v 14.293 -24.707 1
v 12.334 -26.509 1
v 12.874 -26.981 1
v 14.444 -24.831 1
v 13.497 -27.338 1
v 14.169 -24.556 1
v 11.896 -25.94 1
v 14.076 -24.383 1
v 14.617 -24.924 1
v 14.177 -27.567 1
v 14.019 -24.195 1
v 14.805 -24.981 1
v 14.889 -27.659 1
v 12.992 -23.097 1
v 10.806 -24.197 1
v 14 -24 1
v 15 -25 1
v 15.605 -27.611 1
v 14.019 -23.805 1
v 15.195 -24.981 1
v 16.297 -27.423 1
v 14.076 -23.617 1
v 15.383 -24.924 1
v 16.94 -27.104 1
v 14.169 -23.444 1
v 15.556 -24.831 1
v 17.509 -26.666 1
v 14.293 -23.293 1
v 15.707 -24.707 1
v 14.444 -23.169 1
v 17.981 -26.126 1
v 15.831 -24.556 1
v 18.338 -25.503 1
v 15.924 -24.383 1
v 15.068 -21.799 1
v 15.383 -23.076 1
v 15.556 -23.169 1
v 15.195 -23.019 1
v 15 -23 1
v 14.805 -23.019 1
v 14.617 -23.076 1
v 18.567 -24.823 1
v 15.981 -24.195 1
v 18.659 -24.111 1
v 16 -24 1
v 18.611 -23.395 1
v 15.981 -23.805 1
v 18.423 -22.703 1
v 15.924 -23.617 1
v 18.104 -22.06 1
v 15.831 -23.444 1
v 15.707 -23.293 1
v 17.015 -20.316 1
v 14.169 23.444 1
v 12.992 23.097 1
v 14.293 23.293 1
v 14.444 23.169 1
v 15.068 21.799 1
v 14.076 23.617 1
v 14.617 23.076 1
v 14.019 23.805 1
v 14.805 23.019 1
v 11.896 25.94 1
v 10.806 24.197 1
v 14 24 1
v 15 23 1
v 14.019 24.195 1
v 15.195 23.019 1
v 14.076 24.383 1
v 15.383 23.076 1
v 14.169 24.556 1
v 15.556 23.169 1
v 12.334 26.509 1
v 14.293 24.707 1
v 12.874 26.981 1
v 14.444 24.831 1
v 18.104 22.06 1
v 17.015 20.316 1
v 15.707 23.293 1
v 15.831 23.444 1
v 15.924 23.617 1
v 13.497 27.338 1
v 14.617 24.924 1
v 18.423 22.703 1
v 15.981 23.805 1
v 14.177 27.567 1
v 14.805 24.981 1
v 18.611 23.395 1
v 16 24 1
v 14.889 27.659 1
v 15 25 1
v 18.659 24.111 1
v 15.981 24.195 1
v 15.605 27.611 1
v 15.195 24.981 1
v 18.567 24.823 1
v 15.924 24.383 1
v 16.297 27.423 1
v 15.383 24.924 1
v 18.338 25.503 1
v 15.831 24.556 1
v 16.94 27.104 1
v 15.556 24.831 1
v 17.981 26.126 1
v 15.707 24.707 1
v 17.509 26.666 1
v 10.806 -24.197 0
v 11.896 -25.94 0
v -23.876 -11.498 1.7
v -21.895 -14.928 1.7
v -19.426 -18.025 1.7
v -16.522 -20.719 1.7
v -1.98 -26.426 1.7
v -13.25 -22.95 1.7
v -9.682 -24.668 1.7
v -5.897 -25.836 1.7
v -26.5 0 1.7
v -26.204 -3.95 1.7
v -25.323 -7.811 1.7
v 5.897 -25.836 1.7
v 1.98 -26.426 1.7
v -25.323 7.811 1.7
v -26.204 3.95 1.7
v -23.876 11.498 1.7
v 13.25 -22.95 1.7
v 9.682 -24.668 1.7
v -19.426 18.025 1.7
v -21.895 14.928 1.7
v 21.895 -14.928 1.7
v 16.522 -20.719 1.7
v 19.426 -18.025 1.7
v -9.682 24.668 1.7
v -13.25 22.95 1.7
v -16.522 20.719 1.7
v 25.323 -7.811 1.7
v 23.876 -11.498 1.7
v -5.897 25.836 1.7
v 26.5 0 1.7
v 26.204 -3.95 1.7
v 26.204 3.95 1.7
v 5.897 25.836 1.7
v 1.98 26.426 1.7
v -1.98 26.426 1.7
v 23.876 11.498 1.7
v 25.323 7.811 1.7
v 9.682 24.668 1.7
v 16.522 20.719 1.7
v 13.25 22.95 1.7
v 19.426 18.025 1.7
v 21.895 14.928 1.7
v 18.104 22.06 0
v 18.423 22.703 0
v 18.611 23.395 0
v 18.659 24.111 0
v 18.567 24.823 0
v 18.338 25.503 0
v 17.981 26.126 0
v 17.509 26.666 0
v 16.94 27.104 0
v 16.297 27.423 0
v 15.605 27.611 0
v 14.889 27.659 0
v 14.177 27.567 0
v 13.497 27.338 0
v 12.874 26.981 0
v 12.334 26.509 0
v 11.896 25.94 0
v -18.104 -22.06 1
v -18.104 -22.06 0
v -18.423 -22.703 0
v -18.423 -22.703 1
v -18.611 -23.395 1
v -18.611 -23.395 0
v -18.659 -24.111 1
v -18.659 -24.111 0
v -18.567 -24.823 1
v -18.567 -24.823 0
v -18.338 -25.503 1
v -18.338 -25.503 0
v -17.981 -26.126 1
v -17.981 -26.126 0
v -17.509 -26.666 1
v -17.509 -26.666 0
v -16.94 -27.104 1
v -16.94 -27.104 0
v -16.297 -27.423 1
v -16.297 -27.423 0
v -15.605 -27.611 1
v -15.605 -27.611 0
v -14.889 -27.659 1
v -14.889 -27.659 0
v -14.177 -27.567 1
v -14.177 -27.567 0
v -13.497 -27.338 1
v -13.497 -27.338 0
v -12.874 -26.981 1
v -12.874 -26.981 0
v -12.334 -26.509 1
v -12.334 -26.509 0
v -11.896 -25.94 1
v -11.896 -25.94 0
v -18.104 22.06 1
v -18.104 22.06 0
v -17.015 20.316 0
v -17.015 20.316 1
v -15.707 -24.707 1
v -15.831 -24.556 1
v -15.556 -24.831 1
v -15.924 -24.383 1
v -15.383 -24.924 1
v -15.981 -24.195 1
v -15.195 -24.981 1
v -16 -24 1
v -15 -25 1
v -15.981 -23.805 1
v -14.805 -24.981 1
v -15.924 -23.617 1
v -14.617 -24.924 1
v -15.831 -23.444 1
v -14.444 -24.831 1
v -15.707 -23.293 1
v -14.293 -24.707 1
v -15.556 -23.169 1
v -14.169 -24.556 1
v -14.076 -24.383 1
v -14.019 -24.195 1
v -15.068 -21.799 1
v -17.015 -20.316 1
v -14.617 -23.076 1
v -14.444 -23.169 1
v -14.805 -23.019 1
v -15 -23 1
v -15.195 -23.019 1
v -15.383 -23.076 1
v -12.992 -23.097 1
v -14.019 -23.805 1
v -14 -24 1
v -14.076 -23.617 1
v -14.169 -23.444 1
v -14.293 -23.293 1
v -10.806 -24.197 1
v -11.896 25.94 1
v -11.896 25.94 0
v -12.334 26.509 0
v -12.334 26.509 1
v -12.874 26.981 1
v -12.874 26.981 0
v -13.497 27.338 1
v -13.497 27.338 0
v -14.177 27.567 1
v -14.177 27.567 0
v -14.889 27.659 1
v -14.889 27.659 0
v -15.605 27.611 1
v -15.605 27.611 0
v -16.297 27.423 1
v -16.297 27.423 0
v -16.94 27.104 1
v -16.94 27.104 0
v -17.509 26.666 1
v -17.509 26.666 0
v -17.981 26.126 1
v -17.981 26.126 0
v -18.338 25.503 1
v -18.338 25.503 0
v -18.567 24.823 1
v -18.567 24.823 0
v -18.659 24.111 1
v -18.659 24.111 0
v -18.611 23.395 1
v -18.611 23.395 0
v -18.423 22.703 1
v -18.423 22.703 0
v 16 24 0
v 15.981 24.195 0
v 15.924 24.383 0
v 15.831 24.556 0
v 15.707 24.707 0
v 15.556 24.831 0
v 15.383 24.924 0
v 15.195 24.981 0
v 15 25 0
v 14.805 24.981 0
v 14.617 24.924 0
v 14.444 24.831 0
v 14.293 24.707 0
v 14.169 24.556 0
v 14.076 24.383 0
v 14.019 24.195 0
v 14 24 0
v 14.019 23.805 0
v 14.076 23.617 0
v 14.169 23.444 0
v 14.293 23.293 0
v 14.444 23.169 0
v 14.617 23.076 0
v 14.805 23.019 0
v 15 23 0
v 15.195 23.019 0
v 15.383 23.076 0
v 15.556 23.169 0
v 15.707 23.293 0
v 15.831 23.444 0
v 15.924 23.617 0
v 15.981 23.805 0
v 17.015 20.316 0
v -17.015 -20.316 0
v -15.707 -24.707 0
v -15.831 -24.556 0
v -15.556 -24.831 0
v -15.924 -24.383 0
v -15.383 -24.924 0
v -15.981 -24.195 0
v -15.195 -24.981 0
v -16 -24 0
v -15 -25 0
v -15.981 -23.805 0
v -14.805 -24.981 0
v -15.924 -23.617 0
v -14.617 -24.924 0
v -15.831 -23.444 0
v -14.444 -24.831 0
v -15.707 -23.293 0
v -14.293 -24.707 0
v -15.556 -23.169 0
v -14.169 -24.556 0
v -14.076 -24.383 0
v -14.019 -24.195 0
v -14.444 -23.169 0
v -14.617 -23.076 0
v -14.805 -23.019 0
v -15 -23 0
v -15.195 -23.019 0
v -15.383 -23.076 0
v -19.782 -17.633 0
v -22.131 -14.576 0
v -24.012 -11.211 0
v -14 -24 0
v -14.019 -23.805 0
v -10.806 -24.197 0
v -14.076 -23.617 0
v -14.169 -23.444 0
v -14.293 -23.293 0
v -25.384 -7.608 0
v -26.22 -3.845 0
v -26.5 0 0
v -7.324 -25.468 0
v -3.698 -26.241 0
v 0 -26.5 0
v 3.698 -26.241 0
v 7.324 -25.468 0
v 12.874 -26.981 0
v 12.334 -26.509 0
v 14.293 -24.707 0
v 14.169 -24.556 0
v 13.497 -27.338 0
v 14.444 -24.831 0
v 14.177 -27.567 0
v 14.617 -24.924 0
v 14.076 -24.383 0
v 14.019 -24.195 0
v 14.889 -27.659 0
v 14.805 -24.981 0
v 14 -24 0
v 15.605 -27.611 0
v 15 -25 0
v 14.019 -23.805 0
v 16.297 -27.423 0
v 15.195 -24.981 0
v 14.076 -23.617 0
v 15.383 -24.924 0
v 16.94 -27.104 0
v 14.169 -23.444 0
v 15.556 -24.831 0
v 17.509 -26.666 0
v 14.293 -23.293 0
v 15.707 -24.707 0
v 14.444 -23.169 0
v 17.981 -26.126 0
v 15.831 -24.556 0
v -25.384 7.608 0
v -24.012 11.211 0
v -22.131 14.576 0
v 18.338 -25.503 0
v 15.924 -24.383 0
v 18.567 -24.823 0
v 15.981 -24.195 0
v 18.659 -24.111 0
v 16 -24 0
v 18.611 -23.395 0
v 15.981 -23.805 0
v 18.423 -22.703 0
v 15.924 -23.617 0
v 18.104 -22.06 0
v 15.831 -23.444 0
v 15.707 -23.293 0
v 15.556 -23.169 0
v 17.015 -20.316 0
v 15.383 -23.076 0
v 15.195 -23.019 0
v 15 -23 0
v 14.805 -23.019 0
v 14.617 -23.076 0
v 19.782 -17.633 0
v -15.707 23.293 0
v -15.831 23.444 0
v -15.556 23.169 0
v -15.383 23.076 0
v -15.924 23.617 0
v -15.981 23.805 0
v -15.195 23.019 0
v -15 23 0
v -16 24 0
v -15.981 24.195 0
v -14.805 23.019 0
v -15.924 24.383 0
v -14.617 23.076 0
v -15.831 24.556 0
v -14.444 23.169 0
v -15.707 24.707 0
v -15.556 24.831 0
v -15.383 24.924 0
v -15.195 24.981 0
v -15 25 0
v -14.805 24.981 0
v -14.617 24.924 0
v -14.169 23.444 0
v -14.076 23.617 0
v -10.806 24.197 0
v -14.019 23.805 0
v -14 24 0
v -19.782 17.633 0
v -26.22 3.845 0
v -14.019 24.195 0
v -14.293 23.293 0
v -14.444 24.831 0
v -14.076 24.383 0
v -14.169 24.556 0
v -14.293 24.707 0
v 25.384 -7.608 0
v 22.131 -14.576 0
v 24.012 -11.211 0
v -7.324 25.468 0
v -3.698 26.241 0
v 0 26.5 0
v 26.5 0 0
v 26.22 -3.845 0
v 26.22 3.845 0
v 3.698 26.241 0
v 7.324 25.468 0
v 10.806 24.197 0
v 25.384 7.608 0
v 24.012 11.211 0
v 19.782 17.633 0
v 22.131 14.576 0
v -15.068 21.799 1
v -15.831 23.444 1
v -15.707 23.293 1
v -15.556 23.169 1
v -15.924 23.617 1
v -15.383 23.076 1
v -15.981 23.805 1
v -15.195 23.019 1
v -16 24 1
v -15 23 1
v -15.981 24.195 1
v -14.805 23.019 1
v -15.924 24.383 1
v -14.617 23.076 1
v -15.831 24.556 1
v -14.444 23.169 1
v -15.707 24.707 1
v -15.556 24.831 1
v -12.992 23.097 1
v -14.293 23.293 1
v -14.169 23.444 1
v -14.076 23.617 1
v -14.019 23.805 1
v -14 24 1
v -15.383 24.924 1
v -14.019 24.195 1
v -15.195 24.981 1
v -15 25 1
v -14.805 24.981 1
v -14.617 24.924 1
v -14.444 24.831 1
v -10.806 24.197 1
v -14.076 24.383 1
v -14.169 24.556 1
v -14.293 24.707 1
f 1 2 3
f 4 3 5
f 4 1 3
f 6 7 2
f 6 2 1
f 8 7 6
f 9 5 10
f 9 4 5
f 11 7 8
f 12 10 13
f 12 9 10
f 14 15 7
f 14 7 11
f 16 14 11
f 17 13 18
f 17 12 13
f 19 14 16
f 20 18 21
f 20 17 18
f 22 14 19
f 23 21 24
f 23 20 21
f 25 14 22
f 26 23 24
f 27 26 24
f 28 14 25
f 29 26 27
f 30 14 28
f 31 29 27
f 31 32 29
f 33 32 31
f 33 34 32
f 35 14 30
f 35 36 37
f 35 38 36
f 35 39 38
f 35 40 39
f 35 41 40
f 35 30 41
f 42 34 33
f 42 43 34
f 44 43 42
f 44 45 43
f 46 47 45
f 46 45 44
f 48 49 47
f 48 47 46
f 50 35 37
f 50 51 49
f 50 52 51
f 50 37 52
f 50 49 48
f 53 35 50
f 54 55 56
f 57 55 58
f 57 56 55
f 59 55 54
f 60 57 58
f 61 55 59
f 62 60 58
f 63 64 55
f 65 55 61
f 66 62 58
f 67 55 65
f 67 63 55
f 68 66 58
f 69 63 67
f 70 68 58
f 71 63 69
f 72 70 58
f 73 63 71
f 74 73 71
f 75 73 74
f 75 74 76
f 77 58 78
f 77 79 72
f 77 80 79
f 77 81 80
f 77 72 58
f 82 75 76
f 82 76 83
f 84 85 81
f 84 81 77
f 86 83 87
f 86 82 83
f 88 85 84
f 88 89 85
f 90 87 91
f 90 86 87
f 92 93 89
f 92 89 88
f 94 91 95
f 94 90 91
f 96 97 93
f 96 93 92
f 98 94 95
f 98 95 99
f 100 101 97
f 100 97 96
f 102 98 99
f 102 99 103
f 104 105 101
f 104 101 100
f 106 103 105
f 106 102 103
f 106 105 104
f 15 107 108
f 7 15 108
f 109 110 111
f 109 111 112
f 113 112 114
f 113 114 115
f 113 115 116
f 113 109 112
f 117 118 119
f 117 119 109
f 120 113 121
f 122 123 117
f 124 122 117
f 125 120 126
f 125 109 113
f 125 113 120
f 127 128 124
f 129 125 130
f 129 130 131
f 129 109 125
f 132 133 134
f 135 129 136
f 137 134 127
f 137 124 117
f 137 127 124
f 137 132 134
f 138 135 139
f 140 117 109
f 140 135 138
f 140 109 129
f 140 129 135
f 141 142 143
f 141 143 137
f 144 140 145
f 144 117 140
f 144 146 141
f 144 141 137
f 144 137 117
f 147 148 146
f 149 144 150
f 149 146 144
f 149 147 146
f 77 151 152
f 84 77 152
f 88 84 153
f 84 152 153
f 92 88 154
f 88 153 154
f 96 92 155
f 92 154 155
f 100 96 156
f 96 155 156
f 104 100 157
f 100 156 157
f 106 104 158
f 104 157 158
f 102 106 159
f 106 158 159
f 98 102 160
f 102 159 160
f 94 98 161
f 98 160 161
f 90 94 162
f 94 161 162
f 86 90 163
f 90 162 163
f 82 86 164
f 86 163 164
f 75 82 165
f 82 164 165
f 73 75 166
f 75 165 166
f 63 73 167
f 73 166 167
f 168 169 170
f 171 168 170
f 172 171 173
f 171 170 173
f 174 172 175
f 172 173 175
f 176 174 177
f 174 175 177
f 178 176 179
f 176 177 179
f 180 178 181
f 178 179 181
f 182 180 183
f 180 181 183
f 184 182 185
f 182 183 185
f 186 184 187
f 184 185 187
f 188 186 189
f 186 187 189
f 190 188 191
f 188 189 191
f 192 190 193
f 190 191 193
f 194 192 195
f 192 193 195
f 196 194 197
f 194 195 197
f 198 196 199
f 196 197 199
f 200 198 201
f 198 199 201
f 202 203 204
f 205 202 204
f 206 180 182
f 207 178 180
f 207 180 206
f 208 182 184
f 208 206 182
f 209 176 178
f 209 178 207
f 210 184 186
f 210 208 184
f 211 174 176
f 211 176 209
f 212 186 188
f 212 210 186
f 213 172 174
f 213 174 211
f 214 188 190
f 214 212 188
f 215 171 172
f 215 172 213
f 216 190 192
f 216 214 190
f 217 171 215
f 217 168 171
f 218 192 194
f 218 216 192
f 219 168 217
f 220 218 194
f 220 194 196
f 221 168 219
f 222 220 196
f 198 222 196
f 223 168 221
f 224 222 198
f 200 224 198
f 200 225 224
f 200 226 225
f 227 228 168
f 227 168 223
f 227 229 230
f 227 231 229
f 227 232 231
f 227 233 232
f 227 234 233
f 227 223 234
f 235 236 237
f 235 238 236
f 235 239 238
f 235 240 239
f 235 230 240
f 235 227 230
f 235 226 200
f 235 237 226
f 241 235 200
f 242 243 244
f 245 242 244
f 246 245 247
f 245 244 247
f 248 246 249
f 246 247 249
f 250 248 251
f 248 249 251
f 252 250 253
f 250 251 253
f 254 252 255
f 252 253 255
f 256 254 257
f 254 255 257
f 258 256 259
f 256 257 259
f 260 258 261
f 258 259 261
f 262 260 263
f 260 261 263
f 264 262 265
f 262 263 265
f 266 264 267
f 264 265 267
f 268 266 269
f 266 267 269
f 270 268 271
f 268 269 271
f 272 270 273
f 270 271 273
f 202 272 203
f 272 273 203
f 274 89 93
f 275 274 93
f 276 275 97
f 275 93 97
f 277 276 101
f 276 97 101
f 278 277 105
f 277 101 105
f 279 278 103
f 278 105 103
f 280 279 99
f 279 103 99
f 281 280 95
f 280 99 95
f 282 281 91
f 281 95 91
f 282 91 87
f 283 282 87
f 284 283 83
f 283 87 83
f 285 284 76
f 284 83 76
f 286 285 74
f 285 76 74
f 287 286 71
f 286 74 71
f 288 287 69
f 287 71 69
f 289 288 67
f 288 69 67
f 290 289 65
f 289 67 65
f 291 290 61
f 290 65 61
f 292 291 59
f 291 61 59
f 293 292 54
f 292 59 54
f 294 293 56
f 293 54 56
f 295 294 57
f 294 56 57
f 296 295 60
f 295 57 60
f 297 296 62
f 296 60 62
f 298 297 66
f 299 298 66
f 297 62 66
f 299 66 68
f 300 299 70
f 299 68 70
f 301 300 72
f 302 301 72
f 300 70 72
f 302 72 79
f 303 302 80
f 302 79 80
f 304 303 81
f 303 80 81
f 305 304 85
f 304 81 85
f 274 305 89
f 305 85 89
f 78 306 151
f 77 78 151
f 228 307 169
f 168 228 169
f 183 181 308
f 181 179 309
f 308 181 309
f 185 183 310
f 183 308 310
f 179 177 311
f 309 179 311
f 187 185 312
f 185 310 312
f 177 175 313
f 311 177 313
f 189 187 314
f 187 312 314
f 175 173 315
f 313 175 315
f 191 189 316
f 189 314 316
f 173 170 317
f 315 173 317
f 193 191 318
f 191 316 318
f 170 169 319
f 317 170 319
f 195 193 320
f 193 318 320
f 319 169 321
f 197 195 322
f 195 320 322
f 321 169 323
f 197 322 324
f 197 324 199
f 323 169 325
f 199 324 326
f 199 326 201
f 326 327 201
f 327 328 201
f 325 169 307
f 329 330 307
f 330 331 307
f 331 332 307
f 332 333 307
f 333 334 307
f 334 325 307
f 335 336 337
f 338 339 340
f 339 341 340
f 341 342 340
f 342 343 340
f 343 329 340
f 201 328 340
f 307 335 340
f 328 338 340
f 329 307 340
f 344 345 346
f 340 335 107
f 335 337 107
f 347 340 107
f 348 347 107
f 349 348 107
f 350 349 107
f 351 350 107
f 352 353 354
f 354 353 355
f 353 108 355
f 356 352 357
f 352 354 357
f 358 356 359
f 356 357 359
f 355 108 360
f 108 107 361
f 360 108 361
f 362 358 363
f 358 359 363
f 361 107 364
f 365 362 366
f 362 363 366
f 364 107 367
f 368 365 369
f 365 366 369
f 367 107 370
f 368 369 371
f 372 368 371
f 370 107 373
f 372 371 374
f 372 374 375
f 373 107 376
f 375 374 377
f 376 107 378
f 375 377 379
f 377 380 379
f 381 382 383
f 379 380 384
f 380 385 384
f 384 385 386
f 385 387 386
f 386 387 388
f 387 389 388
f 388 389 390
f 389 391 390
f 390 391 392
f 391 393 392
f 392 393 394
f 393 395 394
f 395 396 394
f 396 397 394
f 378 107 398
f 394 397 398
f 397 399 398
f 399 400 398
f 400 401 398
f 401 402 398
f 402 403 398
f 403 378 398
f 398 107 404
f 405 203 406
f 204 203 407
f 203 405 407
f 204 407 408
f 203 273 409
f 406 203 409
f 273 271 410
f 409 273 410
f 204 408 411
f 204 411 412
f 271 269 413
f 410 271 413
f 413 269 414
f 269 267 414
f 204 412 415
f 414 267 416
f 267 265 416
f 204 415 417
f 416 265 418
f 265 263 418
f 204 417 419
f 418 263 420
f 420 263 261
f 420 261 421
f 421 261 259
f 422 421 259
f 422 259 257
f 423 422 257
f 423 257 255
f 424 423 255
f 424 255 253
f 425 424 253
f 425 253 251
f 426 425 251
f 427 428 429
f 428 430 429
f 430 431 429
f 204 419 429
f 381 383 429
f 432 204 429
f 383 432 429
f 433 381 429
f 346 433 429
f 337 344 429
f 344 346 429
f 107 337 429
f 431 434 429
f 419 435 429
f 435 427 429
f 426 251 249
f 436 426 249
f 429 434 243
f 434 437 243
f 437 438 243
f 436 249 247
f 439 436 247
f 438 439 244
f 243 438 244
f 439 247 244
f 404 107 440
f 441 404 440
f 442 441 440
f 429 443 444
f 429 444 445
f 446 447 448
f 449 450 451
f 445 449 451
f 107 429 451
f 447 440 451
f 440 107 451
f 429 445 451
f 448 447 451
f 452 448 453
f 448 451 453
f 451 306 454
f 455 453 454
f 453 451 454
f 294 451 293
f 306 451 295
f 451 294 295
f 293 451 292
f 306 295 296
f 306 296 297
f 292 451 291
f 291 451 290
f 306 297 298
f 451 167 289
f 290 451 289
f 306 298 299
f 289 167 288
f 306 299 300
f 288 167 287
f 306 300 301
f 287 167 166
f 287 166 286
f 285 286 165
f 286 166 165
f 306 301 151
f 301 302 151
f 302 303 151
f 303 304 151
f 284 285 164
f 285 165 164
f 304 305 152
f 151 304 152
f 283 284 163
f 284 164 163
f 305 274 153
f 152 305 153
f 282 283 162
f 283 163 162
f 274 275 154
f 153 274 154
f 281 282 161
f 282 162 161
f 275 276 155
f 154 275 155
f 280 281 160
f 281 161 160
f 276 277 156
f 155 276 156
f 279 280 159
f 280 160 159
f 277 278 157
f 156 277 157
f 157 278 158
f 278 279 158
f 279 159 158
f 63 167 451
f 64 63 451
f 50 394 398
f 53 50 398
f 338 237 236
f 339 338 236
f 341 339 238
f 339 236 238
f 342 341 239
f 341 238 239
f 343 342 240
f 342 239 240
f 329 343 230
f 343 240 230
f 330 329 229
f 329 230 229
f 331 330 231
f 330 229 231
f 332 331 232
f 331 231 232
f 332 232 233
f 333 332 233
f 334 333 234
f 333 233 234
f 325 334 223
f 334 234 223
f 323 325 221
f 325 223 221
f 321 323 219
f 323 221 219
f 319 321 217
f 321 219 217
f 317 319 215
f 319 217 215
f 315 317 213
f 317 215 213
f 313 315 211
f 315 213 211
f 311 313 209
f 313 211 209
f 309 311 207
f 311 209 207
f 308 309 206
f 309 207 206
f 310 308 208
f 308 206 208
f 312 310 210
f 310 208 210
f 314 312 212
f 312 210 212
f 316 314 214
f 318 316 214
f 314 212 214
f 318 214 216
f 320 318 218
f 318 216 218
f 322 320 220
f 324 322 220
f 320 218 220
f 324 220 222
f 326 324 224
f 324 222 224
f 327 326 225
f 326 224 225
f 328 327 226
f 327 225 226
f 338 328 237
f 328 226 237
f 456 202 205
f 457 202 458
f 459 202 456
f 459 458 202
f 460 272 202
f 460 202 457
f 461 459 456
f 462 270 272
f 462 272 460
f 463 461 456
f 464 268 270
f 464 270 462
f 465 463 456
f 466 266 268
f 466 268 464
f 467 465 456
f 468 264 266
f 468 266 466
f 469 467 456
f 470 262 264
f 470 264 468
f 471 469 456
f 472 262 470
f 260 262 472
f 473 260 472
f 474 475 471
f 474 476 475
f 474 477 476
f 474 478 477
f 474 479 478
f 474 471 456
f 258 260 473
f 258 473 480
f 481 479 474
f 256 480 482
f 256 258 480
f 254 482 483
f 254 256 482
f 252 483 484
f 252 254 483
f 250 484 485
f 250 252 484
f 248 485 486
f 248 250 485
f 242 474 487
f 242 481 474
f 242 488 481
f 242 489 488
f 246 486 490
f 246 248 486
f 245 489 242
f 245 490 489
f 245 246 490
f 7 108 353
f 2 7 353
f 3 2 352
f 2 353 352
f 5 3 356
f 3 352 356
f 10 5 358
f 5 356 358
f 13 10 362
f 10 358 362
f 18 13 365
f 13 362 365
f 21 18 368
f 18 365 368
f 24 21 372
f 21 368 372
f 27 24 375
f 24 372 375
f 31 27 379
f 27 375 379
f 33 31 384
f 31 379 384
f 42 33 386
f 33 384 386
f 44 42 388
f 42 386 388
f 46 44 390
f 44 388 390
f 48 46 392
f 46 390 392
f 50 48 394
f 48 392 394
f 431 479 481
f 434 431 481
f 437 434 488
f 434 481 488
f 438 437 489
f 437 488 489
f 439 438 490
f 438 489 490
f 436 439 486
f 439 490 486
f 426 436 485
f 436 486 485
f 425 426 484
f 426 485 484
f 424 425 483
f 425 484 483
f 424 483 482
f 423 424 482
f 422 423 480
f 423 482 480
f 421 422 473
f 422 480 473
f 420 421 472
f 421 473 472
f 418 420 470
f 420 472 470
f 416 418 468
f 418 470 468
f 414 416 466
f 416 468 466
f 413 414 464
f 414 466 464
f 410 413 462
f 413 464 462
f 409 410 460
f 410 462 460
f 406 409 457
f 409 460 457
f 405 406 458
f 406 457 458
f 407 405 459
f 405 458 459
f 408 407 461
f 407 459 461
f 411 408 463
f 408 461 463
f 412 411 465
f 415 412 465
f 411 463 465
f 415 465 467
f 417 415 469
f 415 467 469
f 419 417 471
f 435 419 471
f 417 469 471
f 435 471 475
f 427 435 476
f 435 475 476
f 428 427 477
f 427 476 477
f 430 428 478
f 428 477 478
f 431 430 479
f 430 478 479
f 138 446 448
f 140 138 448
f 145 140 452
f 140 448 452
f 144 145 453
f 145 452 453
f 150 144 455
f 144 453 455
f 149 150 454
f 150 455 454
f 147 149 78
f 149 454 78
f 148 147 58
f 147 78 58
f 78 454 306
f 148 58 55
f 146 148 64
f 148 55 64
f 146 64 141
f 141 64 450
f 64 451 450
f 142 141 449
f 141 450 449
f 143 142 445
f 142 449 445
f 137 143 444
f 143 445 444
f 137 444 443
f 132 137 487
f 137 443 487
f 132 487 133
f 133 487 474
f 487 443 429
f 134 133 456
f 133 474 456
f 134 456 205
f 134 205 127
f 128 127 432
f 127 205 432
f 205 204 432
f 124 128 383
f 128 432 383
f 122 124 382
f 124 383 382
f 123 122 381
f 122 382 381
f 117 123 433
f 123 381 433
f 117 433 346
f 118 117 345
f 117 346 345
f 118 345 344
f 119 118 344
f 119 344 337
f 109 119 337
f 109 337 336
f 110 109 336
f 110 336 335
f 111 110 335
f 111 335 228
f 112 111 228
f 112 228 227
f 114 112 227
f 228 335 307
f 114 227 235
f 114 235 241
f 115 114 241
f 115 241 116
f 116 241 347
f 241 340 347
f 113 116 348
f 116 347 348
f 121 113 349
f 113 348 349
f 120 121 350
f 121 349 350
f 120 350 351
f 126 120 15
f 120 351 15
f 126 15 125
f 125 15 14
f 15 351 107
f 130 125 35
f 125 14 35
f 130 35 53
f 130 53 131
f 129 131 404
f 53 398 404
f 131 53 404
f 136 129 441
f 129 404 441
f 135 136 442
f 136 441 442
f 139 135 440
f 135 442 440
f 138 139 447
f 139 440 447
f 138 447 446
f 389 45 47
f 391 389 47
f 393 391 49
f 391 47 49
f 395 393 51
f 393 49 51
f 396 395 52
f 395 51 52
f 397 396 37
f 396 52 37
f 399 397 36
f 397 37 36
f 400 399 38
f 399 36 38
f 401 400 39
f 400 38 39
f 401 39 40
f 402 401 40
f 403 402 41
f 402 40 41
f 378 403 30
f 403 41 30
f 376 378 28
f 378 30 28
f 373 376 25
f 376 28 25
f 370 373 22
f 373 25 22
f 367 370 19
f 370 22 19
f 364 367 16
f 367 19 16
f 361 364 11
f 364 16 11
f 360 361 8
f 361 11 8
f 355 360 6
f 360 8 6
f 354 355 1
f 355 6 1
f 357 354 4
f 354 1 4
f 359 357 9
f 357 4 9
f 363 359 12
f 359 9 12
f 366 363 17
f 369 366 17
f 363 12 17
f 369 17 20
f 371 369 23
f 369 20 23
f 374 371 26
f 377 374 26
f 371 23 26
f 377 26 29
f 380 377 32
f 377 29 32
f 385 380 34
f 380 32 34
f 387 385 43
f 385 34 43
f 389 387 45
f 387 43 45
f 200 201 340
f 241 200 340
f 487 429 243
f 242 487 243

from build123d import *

# Parameters (mm, degrees)
SKETCH_1_R          = 26.5
EXTRUDE_2_DEPTH     = 1.7
EXTRUDE_3_DEPTH     = 1
SKETCH_4_R          = 1
CUT_EXTRUDE_1_DEPTH = 1


with BuildPart() as part:
    # Эскиз1 → Бобышка-Вытянуть2 (new body)
    with BuildSketch(Plane.XY):
        Circle(SKETCH_1_R)
    extrude(amount=EXTRUDE_2_DEPTH)

    # Эскиз3 → Бобышка-Вытянуть3 (add)
    with BuildSketch(Plane.XY):
        with BuildLine():
            Line((0, 6.907283337), (-11.895602995, 25.940248128))
            ThreePointArc((-11.895602995, 25.940248128), (-16.940248128, 27.104397005), (-18.104397005, 22.059751872))
            Line((-18.104397005, 22.059751872), (-4.317052086, 0))
            Line((-4.317052086, 0), (0, 6.907283337))
        make_face()
        with BuildLine():
            Line((11.895602995, 25.940248128), (0, 6.907283337))
            Line((0, 6.907283337), (4.317052086, 0))
            Line((4.317052086, 0), (18.104397005, 22.059751872))
            ThreePointArc((18.104397005, 22.059751872), (16.940248128, 27.104397005), (11.895602995, 25.940248128))
        make_face()
        with BuildLine():
            Line((0, -6.907283337), (-4.317052086, 0))
            Line((-4.317052086, 0), (-18.104397005, -22.059751872))
            ThreePointArc((-18.104397005, -22.059751872), (-16.940248128, -27.104397005), (-11.895602995, -25.940248128))
            Line((-11.895602995, -25.940248128), (0, -6.907283337))
        make_face()
        with BuildLine():
            Line((18.104397005, -22.059751872), (4.317052086, 0))
            Line((4.317052086, 0), (0, -6.907283337))
            Line((0, -6.907283337), (11.895602995, -25.940248128))
            ThreePointArc((11.895602995, -25.940248128), (16.940248128, -27.104397005), (18.104397005, -22.059751872))
        make_face()
    extrude(amount=EXTRUDE_3_DEPTH)

    # Эскиз4 → Вырез-Вытянуть1 (cut)
    with BuildSketch(Plane.XY.offset(1)):
        with Locations((-15, 24)):
            Circle(SKETCH_4_R)
        with Locations((15, 24)):
            Circle(SKETCH_4_R)
        with Locations((15, -24)):
            Circle(SKETCH_4_R)
        with Locations((-15, -24)):
            Circle(SKETCH_4_R)
    extrude(amount=-CUT_EXTRUDE_1_DEPTH, mode=Mode.SUBTRACT)


solid = part.part
